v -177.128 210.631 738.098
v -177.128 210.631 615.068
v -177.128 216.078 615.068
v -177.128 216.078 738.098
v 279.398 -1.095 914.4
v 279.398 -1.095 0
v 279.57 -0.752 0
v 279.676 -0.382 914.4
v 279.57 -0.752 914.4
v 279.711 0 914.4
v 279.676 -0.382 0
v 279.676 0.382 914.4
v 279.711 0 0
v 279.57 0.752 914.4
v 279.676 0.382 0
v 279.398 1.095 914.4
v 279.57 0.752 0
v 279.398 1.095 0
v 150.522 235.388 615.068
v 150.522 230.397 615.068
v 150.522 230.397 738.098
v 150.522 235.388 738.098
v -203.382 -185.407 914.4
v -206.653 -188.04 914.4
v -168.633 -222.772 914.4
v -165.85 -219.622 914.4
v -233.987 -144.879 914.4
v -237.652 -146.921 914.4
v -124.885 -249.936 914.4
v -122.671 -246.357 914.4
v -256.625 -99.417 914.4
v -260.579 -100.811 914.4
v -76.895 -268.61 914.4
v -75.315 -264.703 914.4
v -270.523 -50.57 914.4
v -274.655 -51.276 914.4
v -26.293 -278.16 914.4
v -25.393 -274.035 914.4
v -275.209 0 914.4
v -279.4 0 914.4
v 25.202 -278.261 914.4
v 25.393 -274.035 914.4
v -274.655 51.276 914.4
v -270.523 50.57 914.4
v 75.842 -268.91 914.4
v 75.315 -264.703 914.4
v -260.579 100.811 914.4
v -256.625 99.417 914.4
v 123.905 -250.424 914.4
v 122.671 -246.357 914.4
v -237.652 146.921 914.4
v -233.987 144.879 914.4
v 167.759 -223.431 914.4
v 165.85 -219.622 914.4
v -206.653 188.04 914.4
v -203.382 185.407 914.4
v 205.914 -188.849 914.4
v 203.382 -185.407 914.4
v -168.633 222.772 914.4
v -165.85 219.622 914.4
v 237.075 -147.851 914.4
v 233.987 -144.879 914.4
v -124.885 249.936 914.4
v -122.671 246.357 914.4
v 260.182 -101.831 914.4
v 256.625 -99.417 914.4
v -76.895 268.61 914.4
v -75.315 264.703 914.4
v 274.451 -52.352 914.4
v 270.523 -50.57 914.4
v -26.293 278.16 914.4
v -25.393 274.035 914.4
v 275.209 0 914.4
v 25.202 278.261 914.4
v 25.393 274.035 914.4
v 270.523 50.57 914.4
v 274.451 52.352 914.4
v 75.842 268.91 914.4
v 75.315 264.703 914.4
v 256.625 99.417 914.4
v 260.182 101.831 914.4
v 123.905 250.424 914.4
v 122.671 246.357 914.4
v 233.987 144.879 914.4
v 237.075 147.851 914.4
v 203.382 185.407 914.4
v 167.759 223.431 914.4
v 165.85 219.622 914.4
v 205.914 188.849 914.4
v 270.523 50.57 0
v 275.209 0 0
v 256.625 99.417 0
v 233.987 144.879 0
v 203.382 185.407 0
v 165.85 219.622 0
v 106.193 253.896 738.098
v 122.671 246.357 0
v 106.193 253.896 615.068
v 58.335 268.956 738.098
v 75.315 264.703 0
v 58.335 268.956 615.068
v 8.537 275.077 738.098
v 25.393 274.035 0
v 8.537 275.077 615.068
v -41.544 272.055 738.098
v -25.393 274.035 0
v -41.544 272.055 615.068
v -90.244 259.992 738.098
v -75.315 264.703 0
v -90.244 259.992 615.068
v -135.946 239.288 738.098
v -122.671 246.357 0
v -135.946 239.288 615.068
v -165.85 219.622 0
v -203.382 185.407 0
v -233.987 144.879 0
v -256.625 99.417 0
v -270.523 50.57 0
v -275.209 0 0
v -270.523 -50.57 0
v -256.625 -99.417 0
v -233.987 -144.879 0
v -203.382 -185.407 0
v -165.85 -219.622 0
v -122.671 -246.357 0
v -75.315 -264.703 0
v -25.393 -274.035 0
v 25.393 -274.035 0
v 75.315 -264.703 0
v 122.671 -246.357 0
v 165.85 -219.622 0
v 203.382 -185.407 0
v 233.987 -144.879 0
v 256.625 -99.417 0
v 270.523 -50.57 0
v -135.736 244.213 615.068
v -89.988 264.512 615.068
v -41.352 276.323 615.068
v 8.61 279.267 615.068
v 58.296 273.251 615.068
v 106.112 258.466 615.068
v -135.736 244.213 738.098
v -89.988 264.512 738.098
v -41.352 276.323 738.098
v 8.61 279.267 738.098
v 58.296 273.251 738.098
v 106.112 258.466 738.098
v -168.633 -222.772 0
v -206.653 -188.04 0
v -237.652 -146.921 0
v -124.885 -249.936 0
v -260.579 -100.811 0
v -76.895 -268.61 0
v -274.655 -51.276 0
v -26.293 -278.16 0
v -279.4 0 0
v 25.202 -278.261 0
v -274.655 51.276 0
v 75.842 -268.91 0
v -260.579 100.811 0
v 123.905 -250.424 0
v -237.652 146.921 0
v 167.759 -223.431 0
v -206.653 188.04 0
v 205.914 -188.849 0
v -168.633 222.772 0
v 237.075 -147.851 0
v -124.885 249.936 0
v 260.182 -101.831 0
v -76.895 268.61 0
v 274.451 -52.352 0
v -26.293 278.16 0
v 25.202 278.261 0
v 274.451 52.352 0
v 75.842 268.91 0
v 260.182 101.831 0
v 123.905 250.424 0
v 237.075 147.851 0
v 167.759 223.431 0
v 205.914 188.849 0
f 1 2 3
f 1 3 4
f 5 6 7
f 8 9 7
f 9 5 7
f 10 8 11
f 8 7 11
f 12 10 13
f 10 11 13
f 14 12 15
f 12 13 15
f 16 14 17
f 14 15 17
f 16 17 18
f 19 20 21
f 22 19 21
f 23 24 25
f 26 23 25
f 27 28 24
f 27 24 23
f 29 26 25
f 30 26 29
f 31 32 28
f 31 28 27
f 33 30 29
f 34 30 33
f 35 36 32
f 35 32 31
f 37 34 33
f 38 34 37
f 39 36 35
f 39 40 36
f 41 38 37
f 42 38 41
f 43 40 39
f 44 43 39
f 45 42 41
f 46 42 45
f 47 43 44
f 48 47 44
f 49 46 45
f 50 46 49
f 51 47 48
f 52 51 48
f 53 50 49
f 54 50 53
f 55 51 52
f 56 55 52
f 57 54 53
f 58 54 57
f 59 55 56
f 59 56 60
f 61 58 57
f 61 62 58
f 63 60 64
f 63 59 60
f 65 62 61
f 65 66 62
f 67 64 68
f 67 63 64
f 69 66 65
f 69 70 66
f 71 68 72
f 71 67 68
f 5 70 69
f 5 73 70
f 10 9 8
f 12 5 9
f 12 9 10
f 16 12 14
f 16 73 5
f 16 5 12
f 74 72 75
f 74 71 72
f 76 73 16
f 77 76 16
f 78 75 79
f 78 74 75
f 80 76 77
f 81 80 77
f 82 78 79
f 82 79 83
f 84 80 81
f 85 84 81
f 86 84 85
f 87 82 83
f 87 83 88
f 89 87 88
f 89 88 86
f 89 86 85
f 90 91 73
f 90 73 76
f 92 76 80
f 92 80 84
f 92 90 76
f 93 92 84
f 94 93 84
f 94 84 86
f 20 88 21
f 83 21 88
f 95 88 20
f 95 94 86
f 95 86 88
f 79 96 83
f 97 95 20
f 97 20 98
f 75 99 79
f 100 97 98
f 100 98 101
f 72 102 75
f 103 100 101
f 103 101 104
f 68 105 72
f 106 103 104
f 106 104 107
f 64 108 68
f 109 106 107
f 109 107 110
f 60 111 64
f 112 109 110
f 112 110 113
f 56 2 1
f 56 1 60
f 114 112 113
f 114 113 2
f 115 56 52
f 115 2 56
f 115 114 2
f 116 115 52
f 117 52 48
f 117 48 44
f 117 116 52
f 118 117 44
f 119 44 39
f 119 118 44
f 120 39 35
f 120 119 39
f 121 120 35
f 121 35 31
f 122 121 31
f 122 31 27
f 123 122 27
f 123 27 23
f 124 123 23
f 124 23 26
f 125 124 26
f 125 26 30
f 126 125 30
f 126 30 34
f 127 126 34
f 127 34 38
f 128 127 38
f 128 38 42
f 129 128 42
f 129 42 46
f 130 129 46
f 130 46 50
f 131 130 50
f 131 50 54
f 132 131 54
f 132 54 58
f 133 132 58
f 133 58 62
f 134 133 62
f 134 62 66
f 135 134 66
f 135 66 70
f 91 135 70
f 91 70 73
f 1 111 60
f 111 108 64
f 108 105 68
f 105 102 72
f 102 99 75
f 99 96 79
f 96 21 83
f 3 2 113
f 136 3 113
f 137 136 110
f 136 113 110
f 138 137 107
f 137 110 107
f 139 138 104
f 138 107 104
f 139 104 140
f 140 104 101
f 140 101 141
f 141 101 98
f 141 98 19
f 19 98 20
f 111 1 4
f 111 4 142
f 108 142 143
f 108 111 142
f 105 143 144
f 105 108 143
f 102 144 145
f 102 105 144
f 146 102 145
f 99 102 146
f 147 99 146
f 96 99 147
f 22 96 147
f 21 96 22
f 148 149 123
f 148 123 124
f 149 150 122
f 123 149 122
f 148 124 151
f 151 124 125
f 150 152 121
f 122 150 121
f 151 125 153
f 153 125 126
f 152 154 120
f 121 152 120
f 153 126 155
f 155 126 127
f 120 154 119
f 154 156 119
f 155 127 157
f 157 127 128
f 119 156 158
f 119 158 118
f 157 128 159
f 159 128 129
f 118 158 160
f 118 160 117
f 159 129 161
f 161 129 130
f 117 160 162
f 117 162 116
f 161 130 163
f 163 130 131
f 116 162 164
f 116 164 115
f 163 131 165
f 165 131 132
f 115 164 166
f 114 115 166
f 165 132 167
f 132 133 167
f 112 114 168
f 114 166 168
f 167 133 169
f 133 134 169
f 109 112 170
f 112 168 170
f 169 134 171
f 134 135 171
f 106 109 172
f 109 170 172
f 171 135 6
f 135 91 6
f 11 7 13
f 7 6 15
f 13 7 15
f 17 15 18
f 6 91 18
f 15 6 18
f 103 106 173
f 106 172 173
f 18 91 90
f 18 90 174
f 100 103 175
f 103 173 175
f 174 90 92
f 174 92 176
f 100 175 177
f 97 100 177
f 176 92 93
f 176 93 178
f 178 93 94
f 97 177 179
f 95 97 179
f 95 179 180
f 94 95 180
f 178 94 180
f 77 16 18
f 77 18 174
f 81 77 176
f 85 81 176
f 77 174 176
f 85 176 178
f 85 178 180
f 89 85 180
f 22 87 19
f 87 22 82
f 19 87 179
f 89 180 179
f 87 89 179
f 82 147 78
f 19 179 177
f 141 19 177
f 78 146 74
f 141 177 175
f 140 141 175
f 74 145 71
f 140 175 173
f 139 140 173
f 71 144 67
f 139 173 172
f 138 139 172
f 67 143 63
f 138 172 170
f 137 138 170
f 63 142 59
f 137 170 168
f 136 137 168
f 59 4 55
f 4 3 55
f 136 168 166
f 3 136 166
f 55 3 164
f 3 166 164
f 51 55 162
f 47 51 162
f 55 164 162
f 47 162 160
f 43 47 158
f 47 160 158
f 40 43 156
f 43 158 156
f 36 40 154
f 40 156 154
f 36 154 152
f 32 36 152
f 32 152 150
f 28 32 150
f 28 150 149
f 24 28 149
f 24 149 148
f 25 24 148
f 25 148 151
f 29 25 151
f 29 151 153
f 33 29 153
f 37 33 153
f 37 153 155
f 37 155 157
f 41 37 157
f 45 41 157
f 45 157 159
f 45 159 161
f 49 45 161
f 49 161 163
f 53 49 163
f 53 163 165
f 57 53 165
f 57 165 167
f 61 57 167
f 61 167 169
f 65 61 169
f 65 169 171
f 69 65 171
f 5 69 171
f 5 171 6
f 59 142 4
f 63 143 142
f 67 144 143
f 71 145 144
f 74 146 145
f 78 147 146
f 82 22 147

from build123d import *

# Parameters (mm, degrees)
F0_R     = 279.4
F0_R_2   = 275.209
F1_DEPTH = 914.4
F2_W     = 327.650912
F2_H     = 123.030126
F3_DEPTH = 279.401
F4_R     = 2.070551
F5_DEPTH = 914.4


with BuildPart() as f1:
    # F0 (on Top) → F1 (new body)
    with BuildSketch(Plane.XY):
        Circle(F0_R)
        Circle(F0_R_2, mode=Mode.SUBTRACT)
    extrude(amount=F1_DEPTH)

    # F2 (on Front) → F3 (cut, through all)
    with BuildSketch(Plane.XZ):
        with Locations((-13.302971, 676.583201)):
            Rectangle(F2_W, F2_H)
    extrude(amount=-F3_DEPTH, mode=Mode.SUBTRACT)

    # F4 (on Top) → F5 (join)
    with BuildSketch(Plane.XY):
        with Locations((277.640581, 0)):
            Circle(F4_R)
    extrude(amount=F5_DEPTH)


solid = f1.part
